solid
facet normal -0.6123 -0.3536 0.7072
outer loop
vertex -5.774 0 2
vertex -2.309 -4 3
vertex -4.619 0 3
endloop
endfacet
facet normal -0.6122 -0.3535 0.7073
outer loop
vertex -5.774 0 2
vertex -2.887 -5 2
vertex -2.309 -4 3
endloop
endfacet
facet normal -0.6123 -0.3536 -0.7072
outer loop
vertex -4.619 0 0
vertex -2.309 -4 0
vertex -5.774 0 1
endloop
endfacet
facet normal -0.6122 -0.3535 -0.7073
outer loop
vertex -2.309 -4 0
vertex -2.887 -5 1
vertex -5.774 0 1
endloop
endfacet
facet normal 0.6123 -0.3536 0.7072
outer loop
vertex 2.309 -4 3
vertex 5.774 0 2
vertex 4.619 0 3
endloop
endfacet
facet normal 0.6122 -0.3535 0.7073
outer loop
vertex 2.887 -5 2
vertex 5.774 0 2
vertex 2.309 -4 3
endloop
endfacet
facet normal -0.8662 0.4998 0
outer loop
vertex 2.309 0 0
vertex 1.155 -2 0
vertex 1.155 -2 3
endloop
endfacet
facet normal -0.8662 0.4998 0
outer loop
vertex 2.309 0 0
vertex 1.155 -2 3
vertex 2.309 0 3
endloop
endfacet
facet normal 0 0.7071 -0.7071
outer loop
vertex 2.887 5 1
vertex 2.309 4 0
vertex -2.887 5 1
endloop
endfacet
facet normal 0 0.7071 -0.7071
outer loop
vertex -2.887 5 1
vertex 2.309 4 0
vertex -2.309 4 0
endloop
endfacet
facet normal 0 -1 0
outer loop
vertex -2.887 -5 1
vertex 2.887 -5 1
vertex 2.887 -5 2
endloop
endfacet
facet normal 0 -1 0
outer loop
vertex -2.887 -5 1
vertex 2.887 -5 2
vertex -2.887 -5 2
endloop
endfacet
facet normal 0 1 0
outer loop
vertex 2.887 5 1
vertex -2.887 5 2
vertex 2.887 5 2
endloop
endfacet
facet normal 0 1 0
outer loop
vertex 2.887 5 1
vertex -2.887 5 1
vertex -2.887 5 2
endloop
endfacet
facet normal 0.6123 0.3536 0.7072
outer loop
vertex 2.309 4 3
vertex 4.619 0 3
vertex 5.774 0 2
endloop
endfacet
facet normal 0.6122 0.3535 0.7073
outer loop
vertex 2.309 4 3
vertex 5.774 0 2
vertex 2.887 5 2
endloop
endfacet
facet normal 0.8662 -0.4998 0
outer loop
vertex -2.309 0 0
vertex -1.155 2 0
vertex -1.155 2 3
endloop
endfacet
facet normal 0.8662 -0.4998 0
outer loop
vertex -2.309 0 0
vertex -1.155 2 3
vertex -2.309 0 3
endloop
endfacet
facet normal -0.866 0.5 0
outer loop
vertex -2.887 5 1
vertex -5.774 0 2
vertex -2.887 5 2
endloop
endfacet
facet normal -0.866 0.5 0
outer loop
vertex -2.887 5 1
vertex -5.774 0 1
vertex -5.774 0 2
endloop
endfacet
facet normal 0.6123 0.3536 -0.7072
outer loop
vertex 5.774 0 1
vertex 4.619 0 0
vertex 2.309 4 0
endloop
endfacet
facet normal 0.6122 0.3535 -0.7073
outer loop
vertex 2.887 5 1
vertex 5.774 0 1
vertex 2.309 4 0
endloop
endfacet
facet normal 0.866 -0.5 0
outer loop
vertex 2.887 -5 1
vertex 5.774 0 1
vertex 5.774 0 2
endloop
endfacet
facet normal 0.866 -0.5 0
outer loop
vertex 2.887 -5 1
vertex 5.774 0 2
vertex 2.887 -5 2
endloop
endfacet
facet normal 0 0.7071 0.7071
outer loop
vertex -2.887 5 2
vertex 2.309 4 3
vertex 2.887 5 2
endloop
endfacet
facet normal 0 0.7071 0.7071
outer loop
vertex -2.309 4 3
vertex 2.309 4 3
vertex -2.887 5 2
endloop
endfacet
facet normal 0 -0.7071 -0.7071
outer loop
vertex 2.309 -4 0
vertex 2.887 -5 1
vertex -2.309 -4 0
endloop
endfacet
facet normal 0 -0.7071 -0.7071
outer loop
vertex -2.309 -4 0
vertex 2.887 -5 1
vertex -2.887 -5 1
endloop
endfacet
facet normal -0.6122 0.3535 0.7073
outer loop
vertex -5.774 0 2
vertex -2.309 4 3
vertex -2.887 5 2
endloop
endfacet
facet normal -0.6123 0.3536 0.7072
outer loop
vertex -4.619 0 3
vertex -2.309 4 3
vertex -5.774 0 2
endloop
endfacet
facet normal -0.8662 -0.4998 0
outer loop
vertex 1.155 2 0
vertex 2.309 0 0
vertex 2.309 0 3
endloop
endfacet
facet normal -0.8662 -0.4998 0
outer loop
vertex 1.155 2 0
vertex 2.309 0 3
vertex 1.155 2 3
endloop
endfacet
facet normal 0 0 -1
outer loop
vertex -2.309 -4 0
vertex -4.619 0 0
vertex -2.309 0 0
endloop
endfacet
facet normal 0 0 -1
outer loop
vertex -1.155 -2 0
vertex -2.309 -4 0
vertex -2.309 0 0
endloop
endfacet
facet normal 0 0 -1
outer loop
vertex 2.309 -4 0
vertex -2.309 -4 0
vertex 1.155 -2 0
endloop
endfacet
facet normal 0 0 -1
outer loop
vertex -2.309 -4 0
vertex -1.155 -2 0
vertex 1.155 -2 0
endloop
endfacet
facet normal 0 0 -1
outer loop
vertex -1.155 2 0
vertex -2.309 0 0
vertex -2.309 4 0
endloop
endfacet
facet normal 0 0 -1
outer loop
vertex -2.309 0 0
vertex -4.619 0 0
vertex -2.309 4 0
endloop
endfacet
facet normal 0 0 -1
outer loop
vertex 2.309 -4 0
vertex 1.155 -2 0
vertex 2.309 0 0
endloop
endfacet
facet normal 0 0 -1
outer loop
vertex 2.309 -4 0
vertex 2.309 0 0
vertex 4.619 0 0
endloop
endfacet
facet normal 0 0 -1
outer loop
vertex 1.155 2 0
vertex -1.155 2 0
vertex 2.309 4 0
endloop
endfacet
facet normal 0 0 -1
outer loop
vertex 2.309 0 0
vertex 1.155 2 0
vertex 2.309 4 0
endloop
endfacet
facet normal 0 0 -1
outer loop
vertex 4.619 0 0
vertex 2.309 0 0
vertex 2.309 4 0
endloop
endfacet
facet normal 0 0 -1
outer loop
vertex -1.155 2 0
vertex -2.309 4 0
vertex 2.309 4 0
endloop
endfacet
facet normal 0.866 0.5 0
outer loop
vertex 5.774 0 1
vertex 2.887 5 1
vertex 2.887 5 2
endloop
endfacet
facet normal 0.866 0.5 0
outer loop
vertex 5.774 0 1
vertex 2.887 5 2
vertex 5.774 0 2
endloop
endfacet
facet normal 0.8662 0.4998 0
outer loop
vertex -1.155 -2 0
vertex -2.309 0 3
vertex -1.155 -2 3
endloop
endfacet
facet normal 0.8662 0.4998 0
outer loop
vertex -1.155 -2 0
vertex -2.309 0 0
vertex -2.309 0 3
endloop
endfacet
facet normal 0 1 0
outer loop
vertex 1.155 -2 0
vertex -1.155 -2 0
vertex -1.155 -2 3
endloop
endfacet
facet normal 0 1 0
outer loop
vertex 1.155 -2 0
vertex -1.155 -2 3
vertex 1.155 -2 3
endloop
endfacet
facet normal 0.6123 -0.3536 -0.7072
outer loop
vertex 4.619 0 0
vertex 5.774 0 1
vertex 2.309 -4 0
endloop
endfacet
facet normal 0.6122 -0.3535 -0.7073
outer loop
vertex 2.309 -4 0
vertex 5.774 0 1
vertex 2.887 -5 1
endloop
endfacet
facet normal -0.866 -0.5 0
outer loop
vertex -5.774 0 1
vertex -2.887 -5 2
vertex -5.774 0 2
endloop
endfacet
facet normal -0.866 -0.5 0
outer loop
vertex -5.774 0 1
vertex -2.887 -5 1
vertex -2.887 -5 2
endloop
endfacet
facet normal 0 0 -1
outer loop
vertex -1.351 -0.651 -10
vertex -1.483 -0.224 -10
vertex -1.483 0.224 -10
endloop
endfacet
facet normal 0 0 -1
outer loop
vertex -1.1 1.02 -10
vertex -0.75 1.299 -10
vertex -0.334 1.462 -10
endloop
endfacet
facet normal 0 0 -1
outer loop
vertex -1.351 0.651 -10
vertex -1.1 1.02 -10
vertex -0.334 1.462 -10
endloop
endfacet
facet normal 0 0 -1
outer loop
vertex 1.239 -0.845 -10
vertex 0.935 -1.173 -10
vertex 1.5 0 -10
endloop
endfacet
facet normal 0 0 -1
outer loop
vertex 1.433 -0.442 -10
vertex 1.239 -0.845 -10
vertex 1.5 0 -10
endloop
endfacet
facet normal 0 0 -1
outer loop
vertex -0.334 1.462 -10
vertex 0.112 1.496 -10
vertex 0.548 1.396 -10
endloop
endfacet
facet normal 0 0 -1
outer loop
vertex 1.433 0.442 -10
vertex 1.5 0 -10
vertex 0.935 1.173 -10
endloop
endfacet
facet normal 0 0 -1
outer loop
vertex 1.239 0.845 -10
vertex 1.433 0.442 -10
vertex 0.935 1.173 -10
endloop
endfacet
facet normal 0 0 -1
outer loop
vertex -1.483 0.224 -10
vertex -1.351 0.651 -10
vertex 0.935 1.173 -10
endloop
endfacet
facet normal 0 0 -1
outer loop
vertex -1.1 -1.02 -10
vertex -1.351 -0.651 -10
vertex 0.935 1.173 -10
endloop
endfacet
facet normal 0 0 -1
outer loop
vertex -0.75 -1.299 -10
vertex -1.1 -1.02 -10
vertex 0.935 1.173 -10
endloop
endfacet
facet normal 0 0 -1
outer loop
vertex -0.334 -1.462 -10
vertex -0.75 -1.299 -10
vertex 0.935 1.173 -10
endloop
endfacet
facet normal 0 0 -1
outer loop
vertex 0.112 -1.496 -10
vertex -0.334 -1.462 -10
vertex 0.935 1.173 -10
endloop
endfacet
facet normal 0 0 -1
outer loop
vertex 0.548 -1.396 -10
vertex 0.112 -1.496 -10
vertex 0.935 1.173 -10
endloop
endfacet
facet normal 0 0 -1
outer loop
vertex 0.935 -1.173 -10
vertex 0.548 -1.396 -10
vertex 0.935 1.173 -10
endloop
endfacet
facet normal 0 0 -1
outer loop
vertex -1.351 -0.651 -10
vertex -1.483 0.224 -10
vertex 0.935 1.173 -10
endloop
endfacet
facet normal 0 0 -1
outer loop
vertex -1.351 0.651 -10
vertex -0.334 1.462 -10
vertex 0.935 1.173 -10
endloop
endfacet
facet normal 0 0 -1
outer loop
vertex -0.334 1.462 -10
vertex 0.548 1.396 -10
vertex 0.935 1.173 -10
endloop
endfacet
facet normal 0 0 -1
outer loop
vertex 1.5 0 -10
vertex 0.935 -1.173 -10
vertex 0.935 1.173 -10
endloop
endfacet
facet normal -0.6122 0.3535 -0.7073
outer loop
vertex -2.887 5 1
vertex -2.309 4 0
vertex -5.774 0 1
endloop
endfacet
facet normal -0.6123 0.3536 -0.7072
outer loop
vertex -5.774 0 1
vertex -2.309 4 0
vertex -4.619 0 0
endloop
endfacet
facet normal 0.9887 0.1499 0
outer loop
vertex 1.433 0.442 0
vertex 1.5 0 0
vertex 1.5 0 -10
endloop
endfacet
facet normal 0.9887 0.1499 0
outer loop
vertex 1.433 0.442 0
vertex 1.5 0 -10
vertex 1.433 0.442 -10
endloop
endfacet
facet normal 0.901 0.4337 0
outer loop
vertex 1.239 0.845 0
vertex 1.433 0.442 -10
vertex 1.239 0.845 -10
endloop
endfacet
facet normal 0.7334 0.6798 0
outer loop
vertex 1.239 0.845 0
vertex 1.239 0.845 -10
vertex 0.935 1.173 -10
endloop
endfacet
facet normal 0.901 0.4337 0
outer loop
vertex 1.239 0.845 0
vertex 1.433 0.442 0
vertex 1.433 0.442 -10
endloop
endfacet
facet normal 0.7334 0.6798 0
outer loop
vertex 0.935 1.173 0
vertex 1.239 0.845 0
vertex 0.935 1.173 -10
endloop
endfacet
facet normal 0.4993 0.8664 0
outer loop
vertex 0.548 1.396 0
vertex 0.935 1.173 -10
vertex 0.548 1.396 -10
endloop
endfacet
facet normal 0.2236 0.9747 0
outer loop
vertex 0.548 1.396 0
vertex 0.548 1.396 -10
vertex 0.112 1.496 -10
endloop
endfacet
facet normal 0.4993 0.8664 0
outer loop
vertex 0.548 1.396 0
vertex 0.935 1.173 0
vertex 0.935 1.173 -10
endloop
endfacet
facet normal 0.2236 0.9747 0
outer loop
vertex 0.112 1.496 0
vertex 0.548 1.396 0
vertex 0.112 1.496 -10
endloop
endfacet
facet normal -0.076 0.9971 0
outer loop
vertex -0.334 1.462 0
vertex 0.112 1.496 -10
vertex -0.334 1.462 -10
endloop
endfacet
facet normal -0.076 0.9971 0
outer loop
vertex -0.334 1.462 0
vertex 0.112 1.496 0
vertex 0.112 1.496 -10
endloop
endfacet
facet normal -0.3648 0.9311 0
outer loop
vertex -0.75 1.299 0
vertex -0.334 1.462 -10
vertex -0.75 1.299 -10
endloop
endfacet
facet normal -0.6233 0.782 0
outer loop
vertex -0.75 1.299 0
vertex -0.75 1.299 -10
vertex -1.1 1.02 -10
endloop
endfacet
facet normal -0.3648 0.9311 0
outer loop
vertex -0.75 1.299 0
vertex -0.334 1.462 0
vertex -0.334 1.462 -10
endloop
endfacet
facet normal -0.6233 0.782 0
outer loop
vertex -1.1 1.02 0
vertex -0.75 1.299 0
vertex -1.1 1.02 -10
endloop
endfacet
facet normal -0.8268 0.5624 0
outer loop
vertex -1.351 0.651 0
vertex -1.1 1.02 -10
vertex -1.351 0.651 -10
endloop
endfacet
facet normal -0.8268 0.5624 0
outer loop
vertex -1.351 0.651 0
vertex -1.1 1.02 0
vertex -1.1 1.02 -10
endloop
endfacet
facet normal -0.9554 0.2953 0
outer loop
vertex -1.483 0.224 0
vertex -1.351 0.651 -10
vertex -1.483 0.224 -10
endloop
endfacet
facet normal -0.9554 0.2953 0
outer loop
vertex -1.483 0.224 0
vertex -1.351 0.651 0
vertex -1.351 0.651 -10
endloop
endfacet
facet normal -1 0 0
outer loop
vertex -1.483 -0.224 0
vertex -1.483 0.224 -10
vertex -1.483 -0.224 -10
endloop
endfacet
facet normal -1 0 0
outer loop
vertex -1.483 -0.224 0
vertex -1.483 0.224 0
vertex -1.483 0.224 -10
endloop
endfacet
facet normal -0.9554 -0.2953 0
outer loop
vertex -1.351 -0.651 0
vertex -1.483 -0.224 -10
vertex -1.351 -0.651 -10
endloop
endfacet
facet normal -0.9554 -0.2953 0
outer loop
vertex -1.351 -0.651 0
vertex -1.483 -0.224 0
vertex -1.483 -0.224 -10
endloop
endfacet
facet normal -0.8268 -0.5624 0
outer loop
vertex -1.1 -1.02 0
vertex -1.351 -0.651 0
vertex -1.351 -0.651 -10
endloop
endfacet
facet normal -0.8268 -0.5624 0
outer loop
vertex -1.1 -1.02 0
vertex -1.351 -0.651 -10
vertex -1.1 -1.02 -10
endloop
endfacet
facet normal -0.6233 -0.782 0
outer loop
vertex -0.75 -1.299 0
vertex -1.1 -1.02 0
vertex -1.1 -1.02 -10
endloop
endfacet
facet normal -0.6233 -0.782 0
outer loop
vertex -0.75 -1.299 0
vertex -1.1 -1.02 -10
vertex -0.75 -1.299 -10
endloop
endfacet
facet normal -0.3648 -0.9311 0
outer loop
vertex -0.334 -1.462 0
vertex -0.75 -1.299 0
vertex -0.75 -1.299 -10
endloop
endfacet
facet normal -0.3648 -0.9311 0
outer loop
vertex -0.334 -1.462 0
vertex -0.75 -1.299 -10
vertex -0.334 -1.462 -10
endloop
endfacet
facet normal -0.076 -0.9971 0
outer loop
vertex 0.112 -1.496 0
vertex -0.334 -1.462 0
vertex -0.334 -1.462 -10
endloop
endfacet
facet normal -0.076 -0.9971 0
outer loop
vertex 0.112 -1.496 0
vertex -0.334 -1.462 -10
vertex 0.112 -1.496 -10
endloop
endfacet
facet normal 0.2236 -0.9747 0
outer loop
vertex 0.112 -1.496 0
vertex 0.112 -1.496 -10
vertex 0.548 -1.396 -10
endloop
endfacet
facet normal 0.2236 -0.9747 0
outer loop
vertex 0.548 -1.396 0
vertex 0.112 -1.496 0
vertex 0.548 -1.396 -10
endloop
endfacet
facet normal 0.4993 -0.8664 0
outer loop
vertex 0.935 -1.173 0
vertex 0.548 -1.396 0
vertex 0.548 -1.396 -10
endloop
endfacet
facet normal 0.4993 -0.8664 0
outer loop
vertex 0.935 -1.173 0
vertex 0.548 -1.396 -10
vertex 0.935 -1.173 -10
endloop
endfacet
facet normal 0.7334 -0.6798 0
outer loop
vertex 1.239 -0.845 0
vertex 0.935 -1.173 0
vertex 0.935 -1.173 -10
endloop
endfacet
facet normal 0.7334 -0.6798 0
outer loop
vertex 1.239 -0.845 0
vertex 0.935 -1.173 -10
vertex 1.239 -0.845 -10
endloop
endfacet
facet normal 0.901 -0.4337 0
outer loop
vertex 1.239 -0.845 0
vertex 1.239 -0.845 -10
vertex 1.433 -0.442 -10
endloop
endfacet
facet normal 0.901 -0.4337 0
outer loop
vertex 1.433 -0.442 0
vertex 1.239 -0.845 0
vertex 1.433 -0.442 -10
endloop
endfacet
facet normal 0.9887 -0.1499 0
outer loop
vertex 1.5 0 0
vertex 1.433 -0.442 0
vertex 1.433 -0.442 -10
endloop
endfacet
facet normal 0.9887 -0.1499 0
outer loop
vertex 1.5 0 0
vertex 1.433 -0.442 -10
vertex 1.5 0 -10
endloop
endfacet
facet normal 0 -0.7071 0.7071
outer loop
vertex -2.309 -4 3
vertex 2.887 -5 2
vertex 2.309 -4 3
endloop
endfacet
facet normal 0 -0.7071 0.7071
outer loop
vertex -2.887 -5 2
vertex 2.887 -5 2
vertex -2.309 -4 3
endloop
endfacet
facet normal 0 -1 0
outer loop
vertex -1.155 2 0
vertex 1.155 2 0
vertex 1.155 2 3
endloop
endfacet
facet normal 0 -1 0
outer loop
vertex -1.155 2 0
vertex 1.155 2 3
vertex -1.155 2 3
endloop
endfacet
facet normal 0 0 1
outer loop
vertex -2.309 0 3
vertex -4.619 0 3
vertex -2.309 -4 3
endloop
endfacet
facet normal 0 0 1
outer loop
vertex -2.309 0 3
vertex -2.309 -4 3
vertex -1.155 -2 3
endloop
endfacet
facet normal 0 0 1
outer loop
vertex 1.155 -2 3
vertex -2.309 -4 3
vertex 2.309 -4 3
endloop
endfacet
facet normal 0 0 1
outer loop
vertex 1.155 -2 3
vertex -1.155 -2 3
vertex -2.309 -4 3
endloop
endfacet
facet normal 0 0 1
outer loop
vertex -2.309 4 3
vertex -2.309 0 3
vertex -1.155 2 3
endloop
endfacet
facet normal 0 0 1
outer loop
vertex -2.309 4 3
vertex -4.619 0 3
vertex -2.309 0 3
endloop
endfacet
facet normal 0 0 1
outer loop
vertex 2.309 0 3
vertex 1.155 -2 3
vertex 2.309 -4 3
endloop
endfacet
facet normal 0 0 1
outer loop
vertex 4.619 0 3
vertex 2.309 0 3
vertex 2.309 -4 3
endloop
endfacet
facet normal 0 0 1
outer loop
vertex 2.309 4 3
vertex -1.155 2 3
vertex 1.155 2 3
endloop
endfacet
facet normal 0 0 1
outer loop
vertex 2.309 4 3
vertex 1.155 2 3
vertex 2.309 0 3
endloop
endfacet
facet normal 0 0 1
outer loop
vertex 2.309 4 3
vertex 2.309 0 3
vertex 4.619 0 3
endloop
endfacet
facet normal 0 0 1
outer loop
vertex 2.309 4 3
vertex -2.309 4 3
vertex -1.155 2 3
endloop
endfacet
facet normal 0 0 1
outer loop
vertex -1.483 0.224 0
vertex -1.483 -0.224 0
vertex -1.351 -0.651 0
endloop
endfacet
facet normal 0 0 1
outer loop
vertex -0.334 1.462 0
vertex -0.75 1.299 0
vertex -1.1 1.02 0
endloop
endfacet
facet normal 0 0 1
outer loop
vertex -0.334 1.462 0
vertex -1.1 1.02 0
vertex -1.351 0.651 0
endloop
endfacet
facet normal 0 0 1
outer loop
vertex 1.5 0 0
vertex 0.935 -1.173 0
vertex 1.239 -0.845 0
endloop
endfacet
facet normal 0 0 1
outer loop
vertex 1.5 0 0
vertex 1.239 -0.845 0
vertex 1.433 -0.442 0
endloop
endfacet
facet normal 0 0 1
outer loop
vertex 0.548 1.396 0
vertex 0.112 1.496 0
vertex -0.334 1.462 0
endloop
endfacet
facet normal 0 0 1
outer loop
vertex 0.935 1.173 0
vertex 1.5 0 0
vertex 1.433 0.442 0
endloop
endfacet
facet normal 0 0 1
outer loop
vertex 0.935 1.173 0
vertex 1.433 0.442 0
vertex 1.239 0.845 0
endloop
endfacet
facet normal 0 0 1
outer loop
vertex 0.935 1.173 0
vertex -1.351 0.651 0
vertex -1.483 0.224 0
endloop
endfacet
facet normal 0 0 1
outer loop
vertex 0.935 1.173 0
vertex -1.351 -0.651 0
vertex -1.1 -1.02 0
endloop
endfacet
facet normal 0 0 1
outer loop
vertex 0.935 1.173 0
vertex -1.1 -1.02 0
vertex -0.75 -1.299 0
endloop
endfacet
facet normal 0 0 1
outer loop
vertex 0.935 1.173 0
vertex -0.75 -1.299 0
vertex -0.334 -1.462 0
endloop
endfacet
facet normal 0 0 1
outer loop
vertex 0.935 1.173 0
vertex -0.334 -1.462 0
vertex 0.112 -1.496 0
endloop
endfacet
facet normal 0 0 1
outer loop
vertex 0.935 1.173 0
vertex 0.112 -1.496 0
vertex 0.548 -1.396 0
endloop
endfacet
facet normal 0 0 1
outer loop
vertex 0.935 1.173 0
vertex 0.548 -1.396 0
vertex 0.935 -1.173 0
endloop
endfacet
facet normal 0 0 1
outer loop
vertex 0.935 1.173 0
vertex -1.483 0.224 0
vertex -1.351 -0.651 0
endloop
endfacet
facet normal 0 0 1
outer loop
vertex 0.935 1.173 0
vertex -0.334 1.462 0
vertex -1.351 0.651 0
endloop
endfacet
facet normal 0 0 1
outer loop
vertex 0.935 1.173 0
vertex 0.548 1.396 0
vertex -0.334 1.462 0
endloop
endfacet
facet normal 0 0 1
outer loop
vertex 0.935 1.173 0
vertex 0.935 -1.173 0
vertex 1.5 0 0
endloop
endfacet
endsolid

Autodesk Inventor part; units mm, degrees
ref_plane "YZ Plane" through (0, 0, 0) normal (1, 0, 0) x (0, 1, 0)
ref_plane "XZ Plane" through (0, 0, 0) normal (0, 1, 0) x (-1, 0, 0)
ref_plane "XY Plane" through (0, 0, 0) normal (0, 0, 1) x (1, 0, 0)
sketch "Sketch1" plane through (0, 0, 0) normal (0, 0, 1) x (1, 0, 0)
  line L0 (-2.8868, 5) -> (2.8868, 5)
  line L1 (2.8868, 5) -> (5.7735, 0)
  line L2 (5.7735, 0) -> (2.8868, -5)
  line L3 (2.8868, -5) -> (-2.8868, -5)
  line L4 (-2.8868, -5) -> (-5.7735, 0)
  line L5 (-5.7735, 0) -> (-2.8868, 5)
  circle A0 centre (0, 0) radius 1.5
  line L6 (1.1547, -2) -> (2.3094, 0)
  line L7 (2.3094, 0) -> (1.1547, 2)
  line L8 (1.1547, 2) -> (-1.1547, 2)
  line L9 (-1.1547, 2) -> (-2.3094, 0)
  line L10 (-2.3094, 0) -> (-1.1547, -2)
  line L11 (-1.1547, -2) -> (1.1547, -2)
  dimension "d0" = 3
  dimension "d1" = 10
  dimension "d2" = 5
  dimension "d12" = 3
extrude "Extrusion1" add sketch "Sketch1" along normal blind 3 contours L0 L1 L2 L3 L4 L5 | A0 | L11 L10 L9 L8 L7 L6
extrude "Extrusion2" add sketch "Sketch1" against normal blind 10 contours A0
thread "Thread1" size "M3x0.5" class "6g" standard "ANSI Metric M Profile" full length
chamfer "Chamfer1" distance 1 angle 45 12 edges at (4.3301, -2.5, 0) (4.3301, 2.5, 0) (0, -5, 0) (-4.3301, -2.5, 0) (-4.3301, 2.5, 0) (0, 5, 0) (0, 5, 3) (-4.3301, 2.5, 3) (-4.3301, -2.5, 3) (0, -5, 3) (4.3301, -2.5, 3) (4.3301, 2.5, 3)
extrude "Extrusion3" cut sketch "Sketch1" along normal blind 10 contours A0 | L11 L10 L9 L8 L7 L6
properties part number "Parafuso"
